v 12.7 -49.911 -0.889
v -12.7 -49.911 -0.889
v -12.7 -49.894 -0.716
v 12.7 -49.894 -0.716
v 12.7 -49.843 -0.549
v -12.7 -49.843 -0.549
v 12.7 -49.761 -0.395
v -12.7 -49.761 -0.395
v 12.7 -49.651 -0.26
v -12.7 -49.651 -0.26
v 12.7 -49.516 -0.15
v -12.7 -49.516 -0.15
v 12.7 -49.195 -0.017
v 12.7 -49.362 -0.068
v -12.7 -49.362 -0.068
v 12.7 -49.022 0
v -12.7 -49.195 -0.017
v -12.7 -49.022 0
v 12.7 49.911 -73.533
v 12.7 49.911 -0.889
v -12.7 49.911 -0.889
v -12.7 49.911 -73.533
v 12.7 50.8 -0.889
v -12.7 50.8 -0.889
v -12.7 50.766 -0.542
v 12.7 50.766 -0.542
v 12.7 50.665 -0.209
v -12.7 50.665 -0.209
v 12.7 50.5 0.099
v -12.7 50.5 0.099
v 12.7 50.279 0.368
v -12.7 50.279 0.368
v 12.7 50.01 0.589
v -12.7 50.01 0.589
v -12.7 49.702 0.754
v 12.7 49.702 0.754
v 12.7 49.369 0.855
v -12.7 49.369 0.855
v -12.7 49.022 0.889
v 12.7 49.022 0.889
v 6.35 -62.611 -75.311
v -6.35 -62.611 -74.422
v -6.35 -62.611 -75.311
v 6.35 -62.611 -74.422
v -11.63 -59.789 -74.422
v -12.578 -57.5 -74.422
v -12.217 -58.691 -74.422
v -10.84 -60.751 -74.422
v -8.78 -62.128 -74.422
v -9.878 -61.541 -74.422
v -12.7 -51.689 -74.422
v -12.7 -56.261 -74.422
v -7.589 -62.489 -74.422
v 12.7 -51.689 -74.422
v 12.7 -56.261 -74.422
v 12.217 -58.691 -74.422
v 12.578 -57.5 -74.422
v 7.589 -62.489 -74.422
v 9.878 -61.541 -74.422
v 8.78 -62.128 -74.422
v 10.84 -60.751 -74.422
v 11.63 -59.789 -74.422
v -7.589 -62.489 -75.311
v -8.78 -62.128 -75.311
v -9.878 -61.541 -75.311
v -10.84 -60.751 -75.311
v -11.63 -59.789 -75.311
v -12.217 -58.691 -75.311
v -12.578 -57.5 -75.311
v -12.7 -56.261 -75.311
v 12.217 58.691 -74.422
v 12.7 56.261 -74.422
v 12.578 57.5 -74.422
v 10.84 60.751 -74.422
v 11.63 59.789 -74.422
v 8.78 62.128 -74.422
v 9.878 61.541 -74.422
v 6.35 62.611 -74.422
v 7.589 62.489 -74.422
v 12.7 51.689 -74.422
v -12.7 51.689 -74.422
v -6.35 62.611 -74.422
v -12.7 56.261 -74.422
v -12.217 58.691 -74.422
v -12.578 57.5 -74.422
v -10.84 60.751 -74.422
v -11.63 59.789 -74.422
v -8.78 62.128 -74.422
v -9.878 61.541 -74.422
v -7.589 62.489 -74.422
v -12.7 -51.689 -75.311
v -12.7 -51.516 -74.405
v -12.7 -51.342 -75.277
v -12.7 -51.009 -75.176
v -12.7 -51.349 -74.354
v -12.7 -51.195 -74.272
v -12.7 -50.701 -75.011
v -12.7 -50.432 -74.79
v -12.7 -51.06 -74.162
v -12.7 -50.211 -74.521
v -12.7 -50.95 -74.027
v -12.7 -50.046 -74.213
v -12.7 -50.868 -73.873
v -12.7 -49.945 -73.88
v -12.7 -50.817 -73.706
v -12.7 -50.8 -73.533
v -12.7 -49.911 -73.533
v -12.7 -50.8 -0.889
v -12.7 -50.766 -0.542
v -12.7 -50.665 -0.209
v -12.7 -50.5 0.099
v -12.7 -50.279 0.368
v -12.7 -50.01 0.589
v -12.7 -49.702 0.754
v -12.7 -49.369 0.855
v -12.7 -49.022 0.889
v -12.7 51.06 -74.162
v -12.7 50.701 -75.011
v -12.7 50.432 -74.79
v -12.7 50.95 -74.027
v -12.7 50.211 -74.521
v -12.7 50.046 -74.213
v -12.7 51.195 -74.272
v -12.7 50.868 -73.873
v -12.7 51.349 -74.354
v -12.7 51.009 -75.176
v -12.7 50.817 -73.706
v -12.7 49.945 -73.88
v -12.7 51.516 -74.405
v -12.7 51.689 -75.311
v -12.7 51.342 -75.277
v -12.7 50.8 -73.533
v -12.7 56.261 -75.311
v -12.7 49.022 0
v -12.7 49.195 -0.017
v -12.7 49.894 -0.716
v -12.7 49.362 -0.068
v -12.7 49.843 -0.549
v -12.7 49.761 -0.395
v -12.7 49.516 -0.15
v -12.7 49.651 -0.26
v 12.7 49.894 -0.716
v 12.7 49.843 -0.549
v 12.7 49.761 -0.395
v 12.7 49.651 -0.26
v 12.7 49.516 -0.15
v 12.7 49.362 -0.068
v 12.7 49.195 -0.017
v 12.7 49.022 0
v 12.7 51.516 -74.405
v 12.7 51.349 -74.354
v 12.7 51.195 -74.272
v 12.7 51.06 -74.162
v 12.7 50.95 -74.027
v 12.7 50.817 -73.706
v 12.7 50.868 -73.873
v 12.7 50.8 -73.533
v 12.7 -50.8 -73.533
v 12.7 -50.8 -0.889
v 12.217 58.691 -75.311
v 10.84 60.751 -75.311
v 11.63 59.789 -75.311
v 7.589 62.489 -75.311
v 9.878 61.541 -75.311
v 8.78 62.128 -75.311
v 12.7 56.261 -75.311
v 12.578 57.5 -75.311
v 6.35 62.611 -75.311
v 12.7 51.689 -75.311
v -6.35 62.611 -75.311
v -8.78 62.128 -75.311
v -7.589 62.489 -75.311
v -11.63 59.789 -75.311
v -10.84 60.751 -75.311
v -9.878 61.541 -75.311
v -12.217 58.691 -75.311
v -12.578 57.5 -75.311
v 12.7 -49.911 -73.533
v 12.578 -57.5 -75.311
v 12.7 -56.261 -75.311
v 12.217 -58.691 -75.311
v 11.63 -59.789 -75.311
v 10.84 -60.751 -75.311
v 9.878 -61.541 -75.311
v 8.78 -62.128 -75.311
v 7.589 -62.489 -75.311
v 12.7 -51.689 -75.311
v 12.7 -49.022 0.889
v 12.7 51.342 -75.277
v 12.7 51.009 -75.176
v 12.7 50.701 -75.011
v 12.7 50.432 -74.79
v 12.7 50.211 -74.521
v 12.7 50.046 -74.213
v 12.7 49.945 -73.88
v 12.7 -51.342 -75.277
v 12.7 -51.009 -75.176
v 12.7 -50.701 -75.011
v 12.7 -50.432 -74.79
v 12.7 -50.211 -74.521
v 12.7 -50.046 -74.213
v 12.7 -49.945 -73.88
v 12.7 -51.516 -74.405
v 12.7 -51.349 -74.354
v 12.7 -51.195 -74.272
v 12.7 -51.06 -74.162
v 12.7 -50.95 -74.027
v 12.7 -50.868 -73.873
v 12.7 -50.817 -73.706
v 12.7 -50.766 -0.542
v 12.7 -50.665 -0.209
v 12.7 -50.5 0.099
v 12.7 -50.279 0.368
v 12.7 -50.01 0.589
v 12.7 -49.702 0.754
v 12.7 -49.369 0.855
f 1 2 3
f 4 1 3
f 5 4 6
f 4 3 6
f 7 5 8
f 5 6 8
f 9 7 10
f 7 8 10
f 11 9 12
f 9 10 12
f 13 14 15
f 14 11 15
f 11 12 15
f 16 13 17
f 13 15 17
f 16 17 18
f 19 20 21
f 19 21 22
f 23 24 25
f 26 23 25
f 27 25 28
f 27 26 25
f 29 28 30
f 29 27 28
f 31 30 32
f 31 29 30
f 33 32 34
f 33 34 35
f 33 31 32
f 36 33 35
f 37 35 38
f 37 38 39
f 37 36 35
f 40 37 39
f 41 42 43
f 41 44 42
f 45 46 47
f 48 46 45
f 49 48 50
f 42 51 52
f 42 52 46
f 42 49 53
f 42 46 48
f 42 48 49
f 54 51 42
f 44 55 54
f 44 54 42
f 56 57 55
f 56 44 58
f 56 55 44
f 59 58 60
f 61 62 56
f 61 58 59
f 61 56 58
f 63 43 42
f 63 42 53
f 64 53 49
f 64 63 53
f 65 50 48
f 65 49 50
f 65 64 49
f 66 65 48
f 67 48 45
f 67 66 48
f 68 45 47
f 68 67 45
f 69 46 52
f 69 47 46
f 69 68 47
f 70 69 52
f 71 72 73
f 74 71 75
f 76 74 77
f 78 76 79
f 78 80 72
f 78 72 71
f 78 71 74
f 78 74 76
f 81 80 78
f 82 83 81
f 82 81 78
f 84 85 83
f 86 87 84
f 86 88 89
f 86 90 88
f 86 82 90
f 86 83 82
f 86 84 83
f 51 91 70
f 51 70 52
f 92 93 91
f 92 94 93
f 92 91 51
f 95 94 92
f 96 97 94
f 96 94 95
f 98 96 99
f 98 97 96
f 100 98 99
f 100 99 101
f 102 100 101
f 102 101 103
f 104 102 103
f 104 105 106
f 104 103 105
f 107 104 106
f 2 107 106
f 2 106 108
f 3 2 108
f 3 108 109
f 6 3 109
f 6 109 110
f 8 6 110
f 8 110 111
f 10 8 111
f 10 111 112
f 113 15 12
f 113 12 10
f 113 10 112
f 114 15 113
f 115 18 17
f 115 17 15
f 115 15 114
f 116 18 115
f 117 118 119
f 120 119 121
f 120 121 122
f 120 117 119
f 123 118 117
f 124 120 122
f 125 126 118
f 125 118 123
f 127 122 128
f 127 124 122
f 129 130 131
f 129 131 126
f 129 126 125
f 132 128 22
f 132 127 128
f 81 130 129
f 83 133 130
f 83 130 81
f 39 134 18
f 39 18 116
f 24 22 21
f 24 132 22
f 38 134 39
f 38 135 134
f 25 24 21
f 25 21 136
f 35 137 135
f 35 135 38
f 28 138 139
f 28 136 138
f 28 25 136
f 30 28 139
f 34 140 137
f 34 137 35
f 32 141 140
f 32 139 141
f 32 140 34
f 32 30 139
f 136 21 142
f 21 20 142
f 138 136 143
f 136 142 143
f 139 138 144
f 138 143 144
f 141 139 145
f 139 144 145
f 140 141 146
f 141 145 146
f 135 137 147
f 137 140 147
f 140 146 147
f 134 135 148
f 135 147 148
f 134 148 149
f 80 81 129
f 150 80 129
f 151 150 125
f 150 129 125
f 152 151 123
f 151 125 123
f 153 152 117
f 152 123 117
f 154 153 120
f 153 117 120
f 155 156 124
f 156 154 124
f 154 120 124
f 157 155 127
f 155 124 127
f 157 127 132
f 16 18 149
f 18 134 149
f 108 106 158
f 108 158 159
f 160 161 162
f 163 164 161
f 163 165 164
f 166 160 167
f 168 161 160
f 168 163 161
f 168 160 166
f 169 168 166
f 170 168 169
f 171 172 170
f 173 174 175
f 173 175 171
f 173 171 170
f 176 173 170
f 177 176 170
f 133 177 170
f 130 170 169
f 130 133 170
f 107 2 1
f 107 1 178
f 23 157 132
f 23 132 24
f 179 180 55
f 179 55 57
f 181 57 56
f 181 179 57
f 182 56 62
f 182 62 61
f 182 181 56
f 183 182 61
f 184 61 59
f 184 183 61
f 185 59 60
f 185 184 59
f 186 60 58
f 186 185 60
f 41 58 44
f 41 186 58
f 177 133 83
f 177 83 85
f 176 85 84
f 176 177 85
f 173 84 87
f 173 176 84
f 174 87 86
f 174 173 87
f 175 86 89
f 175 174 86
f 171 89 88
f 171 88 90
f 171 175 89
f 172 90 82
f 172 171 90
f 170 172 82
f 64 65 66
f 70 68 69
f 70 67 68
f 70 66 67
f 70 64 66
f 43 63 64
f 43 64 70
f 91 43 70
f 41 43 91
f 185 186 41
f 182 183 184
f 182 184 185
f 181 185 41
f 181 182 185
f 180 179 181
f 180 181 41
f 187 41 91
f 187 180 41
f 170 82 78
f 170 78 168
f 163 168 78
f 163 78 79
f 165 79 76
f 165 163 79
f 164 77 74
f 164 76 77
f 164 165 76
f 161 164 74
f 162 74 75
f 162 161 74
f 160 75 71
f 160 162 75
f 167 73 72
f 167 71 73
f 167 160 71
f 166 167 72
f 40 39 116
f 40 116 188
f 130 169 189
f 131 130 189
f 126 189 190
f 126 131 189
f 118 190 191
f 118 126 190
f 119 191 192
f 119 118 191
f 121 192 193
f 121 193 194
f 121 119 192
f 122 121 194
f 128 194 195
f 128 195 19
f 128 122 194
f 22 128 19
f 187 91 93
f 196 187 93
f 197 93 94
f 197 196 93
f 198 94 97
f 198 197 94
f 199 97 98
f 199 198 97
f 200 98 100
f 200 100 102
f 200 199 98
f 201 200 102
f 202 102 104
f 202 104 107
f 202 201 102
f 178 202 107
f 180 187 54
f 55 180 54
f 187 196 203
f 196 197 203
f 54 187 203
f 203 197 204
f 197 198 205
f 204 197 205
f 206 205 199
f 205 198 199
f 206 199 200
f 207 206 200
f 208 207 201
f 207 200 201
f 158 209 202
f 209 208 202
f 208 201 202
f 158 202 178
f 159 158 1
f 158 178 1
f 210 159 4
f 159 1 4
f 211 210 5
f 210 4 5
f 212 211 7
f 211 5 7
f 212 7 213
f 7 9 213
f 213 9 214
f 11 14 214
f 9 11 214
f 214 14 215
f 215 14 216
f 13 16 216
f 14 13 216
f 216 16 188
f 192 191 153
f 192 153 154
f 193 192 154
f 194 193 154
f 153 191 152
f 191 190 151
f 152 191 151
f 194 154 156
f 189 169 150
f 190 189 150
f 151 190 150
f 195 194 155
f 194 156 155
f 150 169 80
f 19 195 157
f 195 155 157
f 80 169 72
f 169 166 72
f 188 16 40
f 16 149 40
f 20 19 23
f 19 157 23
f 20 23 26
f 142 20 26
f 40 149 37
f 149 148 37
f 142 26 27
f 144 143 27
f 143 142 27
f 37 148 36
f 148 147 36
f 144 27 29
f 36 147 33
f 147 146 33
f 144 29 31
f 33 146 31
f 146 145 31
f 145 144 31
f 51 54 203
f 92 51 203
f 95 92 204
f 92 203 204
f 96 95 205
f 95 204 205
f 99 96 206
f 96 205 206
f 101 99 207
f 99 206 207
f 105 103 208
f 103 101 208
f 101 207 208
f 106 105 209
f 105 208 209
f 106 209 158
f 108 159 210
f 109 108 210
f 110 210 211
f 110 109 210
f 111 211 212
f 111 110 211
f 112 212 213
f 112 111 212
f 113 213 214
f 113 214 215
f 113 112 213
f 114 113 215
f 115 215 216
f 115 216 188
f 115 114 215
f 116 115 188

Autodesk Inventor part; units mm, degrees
ref_plane "YZ Plane" through (0, 0, 0) normal (1, 0, 0) x (0, 1, 0)
ref_plane "XZ Plane" through (0, 0, 0) normal (0, 1, 0) x (-1, 0, 0)
ref_plane "XY Plane" through (0, 0, 0) normal (0, 0, 1) x (1, 0, 0)
sketch "Sketch1" plane through (0, 0, 0) normal (0, 0, 1) x (1, 0, 0)
  line L0 (12.7, -50.8) -> (-12.7, -50.8)
  line L1 (-12.7, -50.8) -> (-12.7, 50.8)
  line L2 (-12.7, 50.8) -> (12.7, 50.8)
  line L3 (12.7, 50.8) -> (12.7, -50.8)
  line L4 (12.7, -50.8) -> (-12.7, 50.8) construction
  line L5 (-12.7, -50.8) -> (12.7, 50.8) construction
  point P0 (0, 0)
  dimension "d0" = 25.4
  dimension "d1" = 101.6
extrude "Plate1" add sketch "Sketch1" along normal blind 0.889
sketch "Sketch2" plane through (12.7, 49.911, 0.889) normal (0, 1, 0) x (-1, 0, 0)
  line L0 (25.4, 0) -> (0, 0)
  line L1 (0, 0) -> (0, -76.2)
  line L2 (0, -76.2) -> (25.4, -76.2)
  line L3 (25.4, -76.2) -> (25.4, 0)
edge flange "Flange1" height 76.2 angle 90 thickness 0.889 bend radius 0.889 thickness toward (0, 1, 0) relief straight relief width 0.889 relief depth 0.4445 corner gap 0.889 corner form 0 edges at (0, 50.8, 0) (0, -50.8, 0) wall of the first edge with corners at (-12.7, 49.911, 0.889) (12.7, 49.911, 0.889) (12.7, 49.911, -75.311) (-12.7, 49.911, -75.311)
bend "Bend1"
corner "Corner1"
sketch "Sketch3" plane through (-12.7, 49.911, -74.422) normal (0, 0, -1) x (-1, 0, 0)
  line L0 (-25.4, 0) -> (0, 0)
  line L1 (0, 0) -> (0, 12.7)
  line L2 (0, 12.7) -> (-25.4, 12.7)
  line L3 (-25.4, 12.7) -> (-25.4, 0)
edge flange "Flange2" height 12.7 angle 90 thickness 0.889 bend radius 0.889 thickness toward (0, 0, -1) relief straight relief width 0.889 relief depth 0.4445 corner gap 0.889 corner form 0 edges at (0, 50.8, -75.311) (0, -50.8, -75.311) wall of the first edge with corners at (12.7, 49.911, -74.422) (-12.7, 49.911, -74.422) (-12.7, 62.611, -74.422) (12.7, 62.611, -74.422)
bend "Bend2"
corner "Corner2"
fillet "Corner Round1" radius 6.35 4 edges at (-12.7, 62.611, -74.8665) (12.7, 62.611, -74.8665) (-12.7, -62.611, -74.8665) (12.7, -62.611, -74.8665)
equation "\"d2\" = Thickness"
equation "\"d3\" = BendReliefWidth"
equation "\"d4\" = BendReliefDepth"
equation "\"d5\" = MinimumRemnant"
equation "\"d6\" = TransitionRadius"
equation "\"d9\" = BendRadius"
equation "\"d10\" = CornerReliefSize"
equation "\"d11\" = GapSize"
equation "\"d12\" = JacobiRadiusSize"
equation "\"d13\" = BendReliefWidth"
equation "\"d14\" = BendReliefDepth"
equation "\"d15\" = MinimumRemnant"
equation "\"d16\" = TransitionRadius"
equation "\"d19\" = BendRadius"
equation "\"d20\" = CornerReliefSize"
equation "\"d21\" = GapSize"
equation "\"d22\" = JacobiRadiusSize"
equation "\"BendRadius\" = Thickness"
equation "\"BendReliefWidth\" = Thickness"
equation "\"BendReliefDepth\" = 0.5 * Thickness"
equation "\"CornerReliefSize\" = 4 * Thickness"
equation "\"MinimumRemnant\" = 2 * Thickness"
equation "\"TransitionRadius\" = BendRadius"
equation "\"JacobiRadiusSize\" = Thickness"
equation "\"GapSize\" = Thickness"
equation "\"Thickness\" = 0.889"
properties part number "Handle" material "Aluminum 6061"
